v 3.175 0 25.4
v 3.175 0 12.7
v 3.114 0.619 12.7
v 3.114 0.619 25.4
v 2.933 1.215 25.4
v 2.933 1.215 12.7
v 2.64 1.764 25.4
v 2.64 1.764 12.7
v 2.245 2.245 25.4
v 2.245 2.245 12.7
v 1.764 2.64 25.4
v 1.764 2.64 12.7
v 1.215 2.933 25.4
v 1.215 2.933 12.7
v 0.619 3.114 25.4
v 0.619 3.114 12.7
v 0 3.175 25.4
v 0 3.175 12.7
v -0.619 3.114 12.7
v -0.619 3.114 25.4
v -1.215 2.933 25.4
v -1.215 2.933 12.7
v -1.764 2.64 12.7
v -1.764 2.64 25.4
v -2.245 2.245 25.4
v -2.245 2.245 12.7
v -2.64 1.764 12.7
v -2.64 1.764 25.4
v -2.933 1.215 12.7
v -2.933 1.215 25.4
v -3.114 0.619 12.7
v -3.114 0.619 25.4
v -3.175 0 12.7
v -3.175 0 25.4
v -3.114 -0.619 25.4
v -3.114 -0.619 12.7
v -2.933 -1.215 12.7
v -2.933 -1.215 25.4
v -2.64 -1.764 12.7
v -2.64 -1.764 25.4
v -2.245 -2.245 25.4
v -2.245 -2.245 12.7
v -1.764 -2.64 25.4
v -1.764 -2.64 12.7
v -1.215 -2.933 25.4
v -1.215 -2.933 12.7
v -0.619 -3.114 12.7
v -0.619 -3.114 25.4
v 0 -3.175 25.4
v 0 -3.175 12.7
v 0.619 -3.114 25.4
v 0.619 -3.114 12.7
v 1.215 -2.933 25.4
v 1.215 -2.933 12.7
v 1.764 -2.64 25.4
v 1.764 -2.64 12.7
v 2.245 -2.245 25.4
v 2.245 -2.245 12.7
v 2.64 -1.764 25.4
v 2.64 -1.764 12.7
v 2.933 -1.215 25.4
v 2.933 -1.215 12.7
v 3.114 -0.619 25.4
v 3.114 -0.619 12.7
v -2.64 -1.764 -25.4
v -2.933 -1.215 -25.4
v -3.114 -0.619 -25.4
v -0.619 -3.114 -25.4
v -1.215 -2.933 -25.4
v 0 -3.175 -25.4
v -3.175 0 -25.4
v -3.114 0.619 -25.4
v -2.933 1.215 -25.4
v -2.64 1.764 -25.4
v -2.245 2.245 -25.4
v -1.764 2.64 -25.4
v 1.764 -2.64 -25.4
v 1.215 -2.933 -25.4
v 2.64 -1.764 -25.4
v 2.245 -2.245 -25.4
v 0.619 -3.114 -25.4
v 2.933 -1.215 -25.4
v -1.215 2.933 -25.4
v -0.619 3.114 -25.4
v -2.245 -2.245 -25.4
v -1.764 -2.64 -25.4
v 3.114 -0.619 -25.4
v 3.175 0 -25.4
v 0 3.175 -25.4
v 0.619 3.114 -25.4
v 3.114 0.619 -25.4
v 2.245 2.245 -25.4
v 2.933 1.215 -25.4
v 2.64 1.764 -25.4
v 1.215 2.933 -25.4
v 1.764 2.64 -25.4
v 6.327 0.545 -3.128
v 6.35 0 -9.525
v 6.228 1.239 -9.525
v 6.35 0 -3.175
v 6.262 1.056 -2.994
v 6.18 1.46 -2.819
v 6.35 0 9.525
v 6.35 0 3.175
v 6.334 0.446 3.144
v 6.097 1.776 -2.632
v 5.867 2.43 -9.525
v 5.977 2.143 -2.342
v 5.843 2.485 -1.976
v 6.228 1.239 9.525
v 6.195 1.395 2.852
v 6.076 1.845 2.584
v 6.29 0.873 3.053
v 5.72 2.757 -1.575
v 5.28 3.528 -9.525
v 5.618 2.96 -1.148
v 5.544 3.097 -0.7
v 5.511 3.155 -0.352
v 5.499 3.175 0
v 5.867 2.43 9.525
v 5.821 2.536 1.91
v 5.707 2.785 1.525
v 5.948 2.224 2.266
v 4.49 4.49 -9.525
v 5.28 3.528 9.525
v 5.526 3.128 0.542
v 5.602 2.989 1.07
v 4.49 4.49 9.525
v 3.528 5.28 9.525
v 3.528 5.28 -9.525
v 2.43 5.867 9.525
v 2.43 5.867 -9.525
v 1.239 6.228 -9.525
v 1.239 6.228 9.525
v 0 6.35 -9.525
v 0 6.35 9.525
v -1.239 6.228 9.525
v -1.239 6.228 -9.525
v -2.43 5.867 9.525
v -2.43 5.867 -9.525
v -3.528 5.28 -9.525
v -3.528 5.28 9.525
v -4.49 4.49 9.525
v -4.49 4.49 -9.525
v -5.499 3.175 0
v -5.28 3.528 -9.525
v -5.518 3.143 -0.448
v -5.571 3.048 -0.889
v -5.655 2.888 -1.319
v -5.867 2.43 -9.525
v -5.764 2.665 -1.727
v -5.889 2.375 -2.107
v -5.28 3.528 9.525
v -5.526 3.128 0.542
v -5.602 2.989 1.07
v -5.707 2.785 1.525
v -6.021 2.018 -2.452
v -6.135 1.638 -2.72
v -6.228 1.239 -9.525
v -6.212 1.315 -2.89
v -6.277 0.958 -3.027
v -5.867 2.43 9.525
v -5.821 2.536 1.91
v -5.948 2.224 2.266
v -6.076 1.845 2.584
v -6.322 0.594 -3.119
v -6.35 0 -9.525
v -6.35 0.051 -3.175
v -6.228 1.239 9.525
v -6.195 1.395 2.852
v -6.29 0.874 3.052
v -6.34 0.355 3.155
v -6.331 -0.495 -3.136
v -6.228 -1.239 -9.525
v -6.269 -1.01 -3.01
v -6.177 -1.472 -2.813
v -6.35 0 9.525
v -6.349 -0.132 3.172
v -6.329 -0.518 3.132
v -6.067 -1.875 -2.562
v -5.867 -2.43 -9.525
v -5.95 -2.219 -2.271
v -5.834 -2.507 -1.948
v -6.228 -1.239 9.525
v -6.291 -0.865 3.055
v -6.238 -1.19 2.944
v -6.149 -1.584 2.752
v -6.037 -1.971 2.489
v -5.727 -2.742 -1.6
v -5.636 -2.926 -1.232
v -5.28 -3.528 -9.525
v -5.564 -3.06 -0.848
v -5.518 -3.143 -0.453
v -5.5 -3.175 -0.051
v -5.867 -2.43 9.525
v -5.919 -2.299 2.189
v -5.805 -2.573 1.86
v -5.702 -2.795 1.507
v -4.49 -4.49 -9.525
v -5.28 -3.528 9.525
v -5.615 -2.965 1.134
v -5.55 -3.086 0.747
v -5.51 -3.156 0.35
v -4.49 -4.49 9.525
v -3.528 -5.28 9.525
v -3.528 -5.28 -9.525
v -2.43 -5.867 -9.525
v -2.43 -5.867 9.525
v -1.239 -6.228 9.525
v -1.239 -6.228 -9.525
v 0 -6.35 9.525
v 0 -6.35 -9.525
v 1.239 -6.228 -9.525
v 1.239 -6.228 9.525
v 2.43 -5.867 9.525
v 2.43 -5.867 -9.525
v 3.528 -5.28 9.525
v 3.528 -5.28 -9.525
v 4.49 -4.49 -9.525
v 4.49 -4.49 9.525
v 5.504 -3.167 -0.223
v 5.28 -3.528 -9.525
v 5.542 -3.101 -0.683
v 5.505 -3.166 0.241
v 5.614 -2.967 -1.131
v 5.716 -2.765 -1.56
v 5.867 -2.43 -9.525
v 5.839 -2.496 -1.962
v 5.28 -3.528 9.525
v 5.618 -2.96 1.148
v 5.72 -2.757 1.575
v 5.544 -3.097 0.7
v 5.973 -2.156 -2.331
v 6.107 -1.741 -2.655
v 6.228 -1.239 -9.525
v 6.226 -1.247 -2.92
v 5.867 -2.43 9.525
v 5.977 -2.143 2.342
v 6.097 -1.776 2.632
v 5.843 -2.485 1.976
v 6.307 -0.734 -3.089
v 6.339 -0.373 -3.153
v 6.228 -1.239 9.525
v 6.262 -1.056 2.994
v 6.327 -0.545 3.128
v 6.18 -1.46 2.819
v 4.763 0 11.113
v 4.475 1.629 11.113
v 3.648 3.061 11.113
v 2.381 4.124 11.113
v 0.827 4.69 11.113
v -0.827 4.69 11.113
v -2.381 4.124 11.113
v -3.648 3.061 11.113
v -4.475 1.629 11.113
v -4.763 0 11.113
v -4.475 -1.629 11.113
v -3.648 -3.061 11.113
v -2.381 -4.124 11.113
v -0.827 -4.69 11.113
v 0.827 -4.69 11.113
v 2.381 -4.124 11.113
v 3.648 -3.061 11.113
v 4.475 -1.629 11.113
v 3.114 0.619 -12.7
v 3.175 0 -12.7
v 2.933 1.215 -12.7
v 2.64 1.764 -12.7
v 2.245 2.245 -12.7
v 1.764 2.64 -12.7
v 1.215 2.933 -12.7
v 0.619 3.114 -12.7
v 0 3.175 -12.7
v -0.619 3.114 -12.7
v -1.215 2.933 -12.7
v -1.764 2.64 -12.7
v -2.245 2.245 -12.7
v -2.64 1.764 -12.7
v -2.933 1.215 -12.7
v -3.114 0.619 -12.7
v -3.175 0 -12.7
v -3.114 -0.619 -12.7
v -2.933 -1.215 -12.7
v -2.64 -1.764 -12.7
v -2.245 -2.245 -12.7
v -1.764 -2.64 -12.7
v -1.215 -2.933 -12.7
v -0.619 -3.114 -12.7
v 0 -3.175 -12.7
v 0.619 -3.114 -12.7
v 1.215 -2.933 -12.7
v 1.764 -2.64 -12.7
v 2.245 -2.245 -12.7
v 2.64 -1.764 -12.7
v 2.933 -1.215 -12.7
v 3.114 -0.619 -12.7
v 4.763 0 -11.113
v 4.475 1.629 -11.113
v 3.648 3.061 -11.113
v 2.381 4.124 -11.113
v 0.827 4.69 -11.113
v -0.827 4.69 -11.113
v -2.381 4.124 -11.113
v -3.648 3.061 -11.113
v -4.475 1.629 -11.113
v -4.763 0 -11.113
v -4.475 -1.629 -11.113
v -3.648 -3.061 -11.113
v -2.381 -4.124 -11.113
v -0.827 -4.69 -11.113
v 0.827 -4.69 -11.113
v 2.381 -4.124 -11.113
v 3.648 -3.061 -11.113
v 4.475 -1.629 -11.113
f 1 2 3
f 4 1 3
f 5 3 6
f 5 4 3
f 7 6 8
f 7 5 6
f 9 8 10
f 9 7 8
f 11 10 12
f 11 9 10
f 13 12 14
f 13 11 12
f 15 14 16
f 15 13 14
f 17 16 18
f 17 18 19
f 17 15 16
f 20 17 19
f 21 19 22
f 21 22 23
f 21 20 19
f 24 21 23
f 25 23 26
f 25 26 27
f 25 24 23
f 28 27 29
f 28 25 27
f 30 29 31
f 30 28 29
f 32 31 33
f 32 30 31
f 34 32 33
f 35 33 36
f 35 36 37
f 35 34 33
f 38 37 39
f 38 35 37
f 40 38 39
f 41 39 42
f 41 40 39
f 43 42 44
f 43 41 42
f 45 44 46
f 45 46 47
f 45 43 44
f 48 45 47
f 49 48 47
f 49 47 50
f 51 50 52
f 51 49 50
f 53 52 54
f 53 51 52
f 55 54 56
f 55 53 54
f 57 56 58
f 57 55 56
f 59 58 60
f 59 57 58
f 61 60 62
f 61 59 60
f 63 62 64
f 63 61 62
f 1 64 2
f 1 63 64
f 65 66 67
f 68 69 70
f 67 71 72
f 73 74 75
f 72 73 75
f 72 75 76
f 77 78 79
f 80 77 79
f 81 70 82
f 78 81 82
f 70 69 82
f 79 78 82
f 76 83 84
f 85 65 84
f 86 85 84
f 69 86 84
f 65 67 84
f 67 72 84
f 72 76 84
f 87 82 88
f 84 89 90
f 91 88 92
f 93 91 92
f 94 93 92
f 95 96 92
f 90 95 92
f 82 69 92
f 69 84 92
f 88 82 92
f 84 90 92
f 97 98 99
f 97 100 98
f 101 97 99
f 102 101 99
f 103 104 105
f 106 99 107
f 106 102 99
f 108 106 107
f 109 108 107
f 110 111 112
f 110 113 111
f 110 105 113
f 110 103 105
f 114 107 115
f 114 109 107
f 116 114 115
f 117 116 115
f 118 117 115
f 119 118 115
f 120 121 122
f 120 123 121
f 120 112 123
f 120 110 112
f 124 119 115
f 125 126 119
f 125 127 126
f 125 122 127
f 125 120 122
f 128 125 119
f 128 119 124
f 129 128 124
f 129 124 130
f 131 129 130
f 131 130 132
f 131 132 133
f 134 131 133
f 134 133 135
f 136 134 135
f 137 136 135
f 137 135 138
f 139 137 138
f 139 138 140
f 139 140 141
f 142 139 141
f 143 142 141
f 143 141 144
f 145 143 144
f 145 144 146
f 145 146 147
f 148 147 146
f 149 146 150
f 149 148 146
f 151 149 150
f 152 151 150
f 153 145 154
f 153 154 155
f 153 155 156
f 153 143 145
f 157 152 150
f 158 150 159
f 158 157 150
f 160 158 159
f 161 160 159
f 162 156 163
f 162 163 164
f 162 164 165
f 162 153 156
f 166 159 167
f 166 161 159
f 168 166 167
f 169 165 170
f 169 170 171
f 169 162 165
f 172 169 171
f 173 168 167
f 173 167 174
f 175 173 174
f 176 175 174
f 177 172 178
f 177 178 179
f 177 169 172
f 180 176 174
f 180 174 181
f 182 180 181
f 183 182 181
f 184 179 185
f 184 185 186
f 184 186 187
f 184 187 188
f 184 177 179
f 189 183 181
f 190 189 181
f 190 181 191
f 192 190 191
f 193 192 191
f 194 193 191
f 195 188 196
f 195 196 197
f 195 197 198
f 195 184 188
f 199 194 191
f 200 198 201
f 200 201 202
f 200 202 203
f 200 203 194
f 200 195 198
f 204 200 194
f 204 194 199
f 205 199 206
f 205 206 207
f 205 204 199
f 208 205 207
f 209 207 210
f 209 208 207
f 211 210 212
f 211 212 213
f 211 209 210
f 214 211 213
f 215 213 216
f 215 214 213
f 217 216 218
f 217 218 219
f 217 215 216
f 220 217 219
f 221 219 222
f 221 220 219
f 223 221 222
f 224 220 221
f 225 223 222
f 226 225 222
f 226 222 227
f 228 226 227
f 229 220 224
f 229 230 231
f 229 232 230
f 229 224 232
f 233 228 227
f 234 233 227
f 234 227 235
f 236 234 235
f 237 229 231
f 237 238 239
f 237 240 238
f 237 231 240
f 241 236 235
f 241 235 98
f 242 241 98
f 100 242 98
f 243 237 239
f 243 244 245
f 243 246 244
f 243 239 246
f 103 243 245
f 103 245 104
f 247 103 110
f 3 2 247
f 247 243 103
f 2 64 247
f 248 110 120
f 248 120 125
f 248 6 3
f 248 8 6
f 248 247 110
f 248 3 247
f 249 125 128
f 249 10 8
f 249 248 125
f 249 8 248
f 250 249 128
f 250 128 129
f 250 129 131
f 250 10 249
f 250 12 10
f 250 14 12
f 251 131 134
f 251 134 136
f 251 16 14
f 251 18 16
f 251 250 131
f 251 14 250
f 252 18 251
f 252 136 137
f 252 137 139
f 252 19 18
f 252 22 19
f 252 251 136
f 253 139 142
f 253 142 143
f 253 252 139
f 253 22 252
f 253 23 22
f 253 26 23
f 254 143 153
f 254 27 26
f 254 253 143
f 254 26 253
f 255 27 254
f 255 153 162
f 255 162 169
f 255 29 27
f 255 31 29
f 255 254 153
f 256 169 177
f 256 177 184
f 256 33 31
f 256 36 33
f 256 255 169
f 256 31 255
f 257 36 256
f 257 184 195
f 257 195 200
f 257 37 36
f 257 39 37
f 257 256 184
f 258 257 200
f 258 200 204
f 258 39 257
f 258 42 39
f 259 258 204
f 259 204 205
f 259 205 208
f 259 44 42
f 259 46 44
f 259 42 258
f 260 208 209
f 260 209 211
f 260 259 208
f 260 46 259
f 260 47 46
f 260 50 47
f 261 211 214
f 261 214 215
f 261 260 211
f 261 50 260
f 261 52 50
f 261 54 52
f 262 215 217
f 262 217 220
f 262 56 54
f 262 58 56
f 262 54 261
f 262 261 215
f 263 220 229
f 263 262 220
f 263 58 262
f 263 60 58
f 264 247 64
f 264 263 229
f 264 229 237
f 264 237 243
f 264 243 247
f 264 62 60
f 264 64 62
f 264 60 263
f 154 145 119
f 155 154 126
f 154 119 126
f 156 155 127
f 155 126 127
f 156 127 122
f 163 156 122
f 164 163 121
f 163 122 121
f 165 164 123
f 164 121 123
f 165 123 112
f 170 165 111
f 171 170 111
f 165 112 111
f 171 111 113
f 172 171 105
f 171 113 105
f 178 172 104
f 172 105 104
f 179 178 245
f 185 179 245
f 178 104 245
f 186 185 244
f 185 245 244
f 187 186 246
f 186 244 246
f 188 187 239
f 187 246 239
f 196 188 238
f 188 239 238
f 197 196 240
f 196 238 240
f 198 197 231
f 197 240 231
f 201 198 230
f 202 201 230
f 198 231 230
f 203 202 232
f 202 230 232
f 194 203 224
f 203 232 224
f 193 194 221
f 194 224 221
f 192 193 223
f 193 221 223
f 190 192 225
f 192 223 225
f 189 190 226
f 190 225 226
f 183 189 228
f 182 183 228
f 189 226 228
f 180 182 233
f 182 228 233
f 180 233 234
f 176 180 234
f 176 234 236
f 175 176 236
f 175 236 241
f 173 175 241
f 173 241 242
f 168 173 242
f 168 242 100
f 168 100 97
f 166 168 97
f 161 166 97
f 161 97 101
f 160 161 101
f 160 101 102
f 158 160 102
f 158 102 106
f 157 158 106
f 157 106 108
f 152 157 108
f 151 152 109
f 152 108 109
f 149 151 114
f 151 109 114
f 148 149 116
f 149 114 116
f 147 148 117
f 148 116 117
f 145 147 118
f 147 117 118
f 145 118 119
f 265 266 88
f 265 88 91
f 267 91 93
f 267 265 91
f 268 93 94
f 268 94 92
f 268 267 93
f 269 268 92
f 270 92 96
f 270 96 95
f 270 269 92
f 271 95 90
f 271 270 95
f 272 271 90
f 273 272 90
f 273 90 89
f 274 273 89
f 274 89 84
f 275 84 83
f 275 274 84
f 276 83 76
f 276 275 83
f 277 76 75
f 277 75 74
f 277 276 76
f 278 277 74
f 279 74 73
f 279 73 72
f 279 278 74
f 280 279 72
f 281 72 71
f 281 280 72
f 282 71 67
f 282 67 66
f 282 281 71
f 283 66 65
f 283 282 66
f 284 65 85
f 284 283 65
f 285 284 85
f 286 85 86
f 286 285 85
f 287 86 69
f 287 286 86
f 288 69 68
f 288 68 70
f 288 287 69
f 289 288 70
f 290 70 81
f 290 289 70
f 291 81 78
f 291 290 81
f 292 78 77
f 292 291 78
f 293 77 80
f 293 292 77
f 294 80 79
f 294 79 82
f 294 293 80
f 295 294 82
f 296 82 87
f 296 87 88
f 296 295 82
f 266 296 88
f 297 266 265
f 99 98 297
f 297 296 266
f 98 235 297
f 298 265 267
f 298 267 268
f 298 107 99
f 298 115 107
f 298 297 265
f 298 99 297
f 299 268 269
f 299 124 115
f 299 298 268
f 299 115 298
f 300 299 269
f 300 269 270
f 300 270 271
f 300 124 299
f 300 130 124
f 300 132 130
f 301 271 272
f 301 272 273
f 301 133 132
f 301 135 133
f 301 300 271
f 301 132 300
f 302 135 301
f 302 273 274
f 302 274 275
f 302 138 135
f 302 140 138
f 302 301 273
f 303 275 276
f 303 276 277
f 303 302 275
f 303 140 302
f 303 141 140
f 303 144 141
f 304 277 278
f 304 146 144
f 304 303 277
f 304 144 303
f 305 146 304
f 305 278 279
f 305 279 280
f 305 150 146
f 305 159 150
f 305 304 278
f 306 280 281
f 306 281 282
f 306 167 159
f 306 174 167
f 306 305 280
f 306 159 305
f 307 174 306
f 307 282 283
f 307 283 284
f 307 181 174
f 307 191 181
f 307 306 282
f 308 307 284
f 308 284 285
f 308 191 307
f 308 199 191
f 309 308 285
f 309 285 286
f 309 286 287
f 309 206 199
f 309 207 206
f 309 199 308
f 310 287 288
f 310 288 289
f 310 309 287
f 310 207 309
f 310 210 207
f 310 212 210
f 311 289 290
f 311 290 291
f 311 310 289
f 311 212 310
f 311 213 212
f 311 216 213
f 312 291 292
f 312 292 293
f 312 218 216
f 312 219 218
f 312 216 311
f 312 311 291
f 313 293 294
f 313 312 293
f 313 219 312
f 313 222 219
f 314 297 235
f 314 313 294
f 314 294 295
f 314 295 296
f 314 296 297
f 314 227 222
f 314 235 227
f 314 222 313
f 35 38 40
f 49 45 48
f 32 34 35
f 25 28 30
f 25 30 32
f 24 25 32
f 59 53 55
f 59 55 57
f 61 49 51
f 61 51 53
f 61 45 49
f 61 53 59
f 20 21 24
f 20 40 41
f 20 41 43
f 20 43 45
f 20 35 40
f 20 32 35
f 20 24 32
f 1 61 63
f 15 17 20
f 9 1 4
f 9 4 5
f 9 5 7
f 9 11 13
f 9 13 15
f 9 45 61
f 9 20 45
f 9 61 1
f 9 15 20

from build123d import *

# Parameters (mm, degrees)
F0_R     = 6.35
F1_DEPTH = 12.7
F2_R     = 3.175
F3_DEPTH = 25.4
F4_SIZE  = 3.17499
F5_R     = 3.175
F6_DEPTH = 12.7


# Not quite as in the source:
# - a fillet or chamfer is up to 0.001 mm smaller than in the source, because OpenCascade refuses the exact size


with BuildPart() as f1:
    # F0 (on Top) → F1 (new body, symmetric)
    with BuildSketch(Plane.XY):
        Circle(F0_R)
    extrude(amount=F1_DEPTH, both=True)

    # F2 (on Top) → F3 (join, symmetric)
    with BuildSketch(Plane.XY):
        Circle(F2_R)
    extrude(amount=F3_DEPTH, both=True)

    # F4 (size 3.175 in the source; OpenCascade refuses exactly that, so slightly less here)
    f4_edges = [f1.edges().sort_by_distance(p)[0] for p in [
        (-6.35, 0, -12.7),
        (-6.35, 0, 12.7),
    ]]
    chamfer(f4_edges, length=F4_SIZE)

    # F5 (on Right) → F6 (cut, symmetric)
    with BuildSketch(Plane.YZ):
        Circle(F5_R)
    extrude(amount=F6_DEPTH, both=True, mode=Mode.SUBTRACT)


solid = f1.part
